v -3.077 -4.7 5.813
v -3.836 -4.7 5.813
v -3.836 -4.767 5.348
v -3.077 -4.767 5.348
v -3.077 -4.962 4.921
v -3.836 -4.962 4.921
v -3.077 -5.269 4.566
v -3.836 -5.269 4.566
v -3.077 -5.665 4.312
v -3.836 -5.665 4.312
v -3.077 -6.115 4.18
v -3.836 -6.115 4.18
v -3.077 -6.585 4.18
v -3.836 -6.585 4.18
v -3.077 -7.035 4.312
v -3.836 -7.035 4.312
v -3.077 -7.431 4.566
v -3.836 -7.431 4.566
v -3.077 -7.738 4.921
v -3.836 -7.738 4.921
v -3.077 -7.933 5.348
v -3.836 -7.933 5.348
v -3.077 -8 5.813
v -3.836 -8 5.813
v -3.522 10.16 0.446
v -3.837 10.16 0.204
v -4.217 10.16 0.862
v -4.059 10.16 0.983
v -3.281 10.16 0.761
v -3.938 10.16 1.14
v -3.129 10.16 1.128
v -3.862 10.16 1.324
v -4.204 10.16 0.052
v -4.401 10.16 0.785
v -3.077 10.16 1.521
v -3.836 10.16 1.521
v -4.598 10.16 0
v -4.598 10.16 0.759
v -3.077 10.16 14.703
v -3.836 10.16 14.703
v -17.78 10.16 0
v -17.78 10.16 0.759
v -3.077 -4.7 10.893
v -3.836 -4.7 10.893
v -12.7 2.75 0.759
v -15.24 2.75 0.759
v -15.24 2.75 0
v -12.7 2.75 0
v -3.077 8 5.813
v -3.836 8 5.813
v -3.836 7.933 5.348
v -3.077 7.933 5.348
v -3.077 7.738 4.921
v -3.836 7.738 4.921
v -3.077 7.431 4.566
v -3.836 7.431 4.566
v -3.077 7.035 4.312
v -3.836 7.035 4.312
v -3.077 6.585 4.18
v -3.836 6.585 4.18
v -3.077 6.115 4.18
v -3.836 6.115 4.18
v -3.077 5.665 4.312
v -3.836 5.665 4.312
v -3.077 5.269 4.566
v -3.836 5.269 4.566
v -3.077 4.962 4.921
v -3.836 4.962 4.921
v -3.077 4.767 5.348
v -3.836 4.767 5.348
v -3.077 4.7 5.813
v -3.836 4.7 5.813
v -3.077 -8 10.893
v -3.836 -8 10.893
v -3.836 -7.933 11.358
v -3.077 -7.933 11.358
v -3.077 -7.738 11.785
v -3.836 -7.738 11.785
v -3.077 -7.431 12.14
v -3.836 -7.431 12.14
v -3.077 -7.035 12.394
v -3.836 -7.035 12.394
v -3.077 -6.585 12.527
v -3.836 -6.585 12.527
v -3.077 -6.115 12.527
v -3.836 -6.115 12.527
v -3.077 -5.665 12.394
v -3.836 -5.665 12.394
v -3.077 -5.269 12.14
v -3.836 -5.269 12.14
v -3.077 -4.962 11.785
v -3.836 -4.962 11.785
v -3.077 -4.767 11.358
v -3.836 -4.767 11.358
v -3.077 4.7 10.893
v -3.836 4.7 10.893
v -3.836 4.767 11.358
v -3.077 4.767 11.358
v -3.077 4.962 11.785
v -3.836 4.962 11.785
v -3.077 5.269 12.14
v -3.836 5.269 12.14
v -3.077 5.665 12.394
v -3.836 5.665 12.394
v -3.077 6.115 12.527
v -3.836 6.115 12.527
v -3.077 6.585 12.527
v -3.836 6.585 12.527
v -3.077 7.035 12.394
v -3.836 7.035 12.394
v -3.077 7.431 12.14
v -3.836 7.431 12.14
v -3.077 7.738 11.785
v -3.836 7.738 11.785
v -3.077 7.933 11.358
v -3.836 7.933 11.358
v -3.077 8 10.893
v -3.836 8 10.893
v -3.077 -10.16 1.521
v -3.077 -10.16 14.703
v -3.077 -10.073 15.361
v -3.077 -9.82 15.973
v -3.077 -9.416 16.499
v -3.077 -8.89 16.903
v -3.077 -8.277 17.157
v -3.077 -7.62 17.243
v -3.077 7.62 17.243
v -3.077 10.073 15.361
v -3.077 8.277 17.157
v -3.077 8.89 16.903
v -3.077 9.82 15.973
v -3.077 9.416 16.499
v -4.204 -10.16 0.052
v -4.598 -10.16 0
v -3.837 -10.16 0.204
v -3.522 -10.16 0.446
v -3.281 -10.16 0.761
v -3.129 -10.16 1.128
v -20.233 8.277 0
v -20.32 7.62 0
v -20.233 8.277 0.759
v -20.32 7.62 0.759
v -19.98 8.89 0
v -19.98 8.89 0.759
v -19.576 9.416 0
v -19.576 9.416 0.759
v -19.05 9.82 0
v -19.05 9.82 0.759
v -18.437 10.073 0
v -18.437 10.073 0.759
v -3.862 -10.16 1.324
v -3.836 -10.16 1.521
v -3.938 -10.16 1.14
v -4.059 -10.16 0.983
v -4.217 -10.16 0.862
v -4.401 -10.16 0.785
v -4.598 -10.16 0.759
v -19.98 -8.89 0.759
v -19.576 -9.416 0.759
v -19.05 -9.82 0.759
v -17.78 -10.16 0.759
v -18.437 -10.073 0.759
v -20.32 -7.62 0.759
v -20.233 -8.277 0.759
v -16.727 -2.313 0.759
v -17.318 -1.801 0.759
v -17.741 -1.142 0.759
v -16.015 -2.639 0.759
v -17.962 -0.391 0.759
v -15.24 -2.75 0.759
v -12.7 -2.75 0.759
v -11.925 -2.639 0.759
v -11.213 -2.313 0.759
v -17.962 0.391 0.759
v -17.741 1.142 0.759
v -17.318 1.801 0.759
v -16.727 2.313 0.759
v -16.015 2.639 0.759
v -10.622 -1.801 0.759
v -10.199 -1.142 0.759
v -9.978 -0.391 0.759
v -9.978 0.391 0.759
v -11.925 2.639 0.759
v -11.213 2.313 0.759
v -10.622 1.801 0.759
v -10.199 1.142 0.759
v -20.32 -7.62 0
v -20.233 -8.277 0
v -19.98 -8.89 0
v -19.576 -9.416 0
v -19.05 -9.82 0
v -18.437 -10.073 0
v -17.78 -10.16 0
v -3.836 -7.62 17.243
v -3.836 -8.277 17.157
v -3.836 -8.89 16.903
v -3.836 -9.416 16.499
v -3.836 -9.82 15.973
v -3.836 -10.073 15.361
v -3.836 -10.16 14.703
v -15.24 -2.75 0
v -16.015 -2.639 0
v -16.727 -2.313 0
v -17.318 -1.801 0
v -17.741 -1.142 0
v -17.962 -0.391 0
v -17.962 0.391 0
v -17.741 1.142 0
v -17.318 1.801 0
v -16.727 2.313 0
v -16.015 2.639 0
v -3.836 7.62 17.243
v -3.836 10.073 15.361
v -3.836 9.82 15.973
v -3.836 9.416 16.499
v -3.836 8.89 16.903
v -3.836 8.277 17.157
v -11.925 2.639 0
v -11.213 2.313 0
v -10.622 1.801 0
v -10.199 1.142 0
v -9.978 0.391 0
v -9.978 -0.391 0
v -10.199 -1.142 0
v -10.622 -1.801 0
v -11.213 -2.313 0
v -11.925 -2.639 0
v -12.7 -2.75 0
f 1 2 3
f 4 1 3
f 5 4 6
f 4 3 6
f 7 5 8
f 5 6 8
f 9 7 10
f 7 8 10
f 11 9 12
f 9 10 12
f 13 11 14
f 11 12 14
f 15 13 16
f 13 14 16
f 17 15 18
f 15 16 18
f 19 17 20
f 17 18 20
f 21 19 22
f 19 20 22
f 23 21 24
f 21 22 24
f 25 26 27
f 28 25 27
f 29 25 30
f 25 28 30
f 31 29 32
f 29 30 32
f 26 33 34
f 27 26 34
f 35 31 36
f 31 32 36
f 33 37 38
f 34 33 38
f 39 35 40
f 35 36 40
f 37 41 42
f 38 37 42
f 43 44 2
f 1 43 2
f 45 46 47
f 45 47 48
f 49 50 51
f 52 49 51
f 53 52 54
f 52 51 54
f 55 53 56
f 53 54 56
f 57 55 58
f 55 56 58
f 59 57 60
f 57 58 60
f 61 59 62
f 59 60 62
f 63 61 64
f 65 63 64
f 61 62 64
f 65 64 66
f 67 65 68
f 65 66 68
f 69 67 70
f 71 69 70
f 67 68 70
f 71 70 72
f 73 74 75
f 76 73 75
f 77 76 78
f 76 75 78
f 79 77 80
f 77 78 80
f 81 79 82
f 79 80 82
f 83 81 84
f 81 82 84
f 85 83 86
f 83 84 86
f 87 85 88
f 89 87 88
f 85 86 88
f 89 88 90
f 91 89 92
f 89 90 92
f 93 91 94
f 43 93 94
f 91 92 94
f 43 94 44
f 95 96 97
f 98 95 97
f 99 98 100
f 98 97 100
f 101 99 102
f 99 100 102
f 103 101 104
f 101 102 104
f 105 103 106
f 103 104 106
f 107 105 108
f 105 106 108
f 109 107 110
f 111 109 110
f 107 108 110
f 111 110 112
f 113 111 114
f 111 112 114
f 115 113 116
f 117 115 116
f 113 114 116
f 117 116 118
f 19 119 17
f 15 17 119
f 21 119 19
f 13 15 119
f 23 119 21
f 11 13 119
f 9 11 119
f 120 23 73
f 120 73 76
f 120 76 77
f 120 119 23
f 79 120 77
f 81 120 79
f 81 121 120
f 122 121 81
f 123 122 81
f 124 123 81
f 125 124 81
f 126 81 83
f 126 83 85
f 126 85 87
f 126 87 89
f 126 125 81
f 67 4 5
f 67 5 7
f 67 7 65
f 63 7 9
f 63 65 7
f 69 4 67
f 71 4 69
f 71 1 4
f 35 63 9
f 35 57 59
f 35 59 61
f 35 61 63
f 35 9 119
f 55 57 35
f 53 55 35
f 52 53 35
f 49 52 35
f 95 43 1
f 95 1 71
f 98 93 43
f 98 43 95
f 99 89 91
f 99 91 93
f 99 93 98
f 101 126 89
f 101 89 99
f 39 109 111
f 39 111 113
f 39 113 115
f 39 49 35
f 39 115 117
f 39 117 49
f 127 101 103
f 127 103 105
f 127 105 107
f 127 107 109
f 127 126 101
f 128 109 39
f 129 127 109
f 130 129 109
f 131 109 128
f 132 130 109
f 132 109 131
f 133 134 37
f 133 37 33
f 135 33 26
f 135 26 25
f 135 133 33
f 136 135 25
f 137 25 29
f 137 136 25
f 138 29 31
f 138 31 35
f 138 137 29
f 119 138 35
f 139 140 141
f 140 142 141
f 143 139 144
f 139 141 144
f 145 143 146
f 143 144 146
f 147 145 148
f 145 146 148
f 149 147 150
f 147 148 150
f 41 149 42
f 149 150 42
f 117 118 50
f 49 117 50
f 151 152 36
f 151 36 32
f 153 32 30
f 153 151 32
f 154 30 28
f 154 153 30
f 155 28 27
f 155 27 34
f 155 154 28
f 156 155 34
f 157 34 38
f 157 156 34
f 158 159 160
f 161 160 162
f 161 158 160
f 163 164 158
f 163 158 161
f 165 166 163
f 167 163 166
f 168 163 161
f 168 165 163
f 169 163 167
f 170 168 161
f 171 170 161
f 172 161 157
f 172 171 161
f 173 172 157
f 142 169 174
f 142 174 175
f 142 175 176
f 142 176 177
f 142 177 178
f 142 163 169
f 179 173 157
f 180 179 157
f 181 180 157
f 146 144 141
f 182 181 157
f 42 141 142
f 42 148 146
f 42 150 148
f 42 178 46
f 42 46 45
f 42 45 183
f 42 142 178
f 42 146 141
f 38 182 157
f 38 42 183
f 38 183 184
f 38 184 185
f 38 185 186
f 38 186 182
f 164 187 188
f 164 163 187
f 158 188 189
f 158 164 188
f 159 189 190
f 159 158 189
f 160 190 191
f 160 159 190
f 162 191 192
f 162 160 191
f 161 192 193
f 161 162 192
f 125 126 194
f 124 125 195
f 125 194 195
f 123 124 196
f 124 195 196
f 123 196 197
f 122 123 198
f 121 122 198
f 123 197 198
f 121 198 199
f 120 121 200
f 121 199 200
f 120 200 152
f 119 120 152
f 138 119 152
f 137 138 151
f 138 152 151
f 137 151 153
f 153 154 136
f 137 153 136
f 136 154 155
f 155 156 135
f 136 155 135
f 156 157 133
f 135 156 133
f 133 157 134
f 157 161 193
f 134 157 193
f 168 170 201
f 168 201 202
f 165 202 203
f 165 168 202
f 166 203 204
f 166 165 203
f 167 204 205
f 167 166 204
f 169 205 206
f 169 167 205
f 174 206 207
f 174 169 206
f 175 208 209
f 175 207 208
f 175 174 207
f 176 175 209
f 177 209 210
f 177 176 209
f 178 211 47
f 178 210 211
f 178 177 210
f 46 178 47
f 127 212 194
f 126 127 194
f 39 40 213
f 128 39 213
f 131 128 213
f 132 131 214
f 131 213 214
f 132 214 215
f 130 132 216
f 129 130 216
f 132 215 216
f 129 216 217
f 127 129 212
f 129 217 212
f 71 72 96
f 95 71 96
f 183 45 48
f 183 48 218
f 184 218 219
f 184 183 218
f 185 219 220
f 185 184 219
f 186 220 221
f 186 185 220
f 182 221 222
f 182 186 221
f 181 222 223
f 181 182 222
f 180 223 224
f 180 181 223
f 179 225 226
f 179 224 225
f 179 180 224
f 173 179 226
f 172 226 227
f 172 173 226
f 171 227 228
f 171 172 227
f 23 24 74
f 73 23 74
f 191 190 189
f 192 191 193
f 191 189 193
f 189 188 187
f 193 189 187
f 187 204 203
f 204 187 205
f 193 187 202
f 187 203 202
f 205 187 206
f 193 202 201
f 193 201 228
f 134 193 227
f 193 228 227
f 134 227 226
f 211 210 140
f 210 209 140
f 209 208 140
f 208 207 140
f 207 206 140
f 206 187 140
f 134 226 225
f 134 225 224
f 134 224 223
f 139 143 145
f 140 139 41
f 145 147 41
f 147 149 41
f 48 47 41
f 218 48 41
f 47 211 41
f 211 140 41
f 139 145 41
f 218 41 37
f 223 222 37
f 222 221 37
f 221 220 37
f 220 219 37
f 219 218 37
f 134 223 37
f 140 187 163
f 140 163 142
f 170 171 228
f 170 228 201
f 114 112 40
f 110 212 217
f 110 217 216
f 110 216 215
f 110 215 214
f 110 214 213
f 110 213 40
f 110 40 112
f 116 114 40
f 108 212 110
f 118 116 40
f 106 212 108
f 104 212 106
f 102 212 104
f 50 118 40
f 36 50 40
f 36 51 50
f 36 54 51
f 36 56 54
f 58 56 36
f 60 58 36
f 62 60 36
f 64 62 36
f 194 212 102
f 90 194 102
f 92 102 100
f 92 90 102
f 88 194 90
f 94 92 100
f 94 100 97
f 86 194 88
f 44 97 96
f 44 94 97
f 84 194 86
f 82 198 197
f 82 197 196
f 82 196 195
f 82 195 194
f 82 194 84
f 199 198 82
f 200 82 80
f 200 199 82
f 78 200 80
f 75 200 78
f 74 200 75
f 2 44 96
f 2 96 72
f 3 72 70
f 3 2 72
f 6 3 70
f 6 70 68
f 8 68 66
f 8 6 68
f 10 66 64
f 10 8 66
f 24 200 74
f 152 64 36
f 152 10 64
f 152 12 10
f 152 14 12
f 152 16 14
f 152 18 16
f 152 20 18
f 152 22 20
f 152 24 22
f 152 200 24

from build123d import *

# Parameters (mm, degrees)
SKETCH1_W                = 33.02
SKETCH1_H                = 20.32
BOSS_EXTRUDE1_DEPTH      = 0.75946
M3_SLOTS_REACH           = 24.731
M5_SLOT_REACH            = 24.731
FILLET1_R                = 2.54
SKETCHED_START           = -3.237390165
SKETCHED_BEND1_OUTLINE_W = 20.32
SKETCHED_BEND1_OUTLINE_H = 0.75946
SKETCHED_BEND1_DEPTH     = 15.937390165
SKETCHED_START_2         = -3.83615356
SKETCHED_BEND1_2_DEPTH   = 0.10270916
SKETCHED_START_3         = -4.59815356
SKETCHED_BEND1_3_DEPTH   = 1.52146
SKETCHED_START_4         = -10.16
SKETCHED_BEND1_4_DEPTH   = 20.32


with BuildPart() as part:
    # Sketch1 → Boss-Extrude1 (new body)
    with BuildSketch(Plane.XY):
        with Locations((-3.81, 0)):
            Rectangle(SKETCH1_W, SKETCH1_H)
    extrude(amount=BOSS_EXTRUDE1_DEPTH)

    # Sketch4 → M3 Slots (cut, up to next)
    with BuildSketch(Plane.XY.offset(0.75946), mode=Mode.PRIVATE) as m3_slots_sk1:
        with BuildLine():
            Line((1.27, 8), (6.35, 8))
            ThreePointArc((6.35, 8), (8, 6.35), (6.35, 4.7))
            Line((6.35, 4.7), (1.27, 4.7))
            ThreePointArc((1.27, 4.7), (-0.38, 6.35), (1.27, 8))
        make_face()
    m3_slots_tool1 = extrude(m3_slots_sk1.sketch, amount=-M3_SLOTS_REACH, mode=Mode.PRIVATE) & part.part
    # Sketch4 → M3 Slots (cut, up to next)
    with BuildSketch(Plane.XY.offset(0.75946), mode=Mode.PRIVATE) as m3_slots_sk2:
        with BuildLine():
            Line((1.27, -4.7), (6.35, -4.7))
            ThreePointArc((6.35, -4.7), (8, -6.35), (6.35, -8))
            Line((6.35, -8), (1.27, -8))
            ThreePointArc((1.27, -8), (-0.38, -6.35), (1.27, -4.7))
        make_face()
    m3_slots_tool2 = extrude(m3_slots_sk2.sketch, amount=-M3_SLOTS_REACH, mode=Mode.PRIVATE) & part.part
    add(m3_slots_tool1.solids().sort_by_distance((3.81, 6.35, 0.75946))[0], mode=Mode.SUBTRACT)
    add(m3_slots_tool2.solids().sort_by_distance((3.81, -6.35, 0.75946))[0], mode=Mode.SUBTRACT)

    # Sketch5 → M5 Slot (cut, up to next)
    with BuildSketch(Plane.XY.offset(0.75946), mode=Mode.PRIVATE) as m5_slot_sk1:
        with BuildLine():
            Line((-15.24, 2.75), (-12.7, 2.75))
            ThreePointArc((-12.7, 2.75), (-9.95, 0), (-12.7, -2.75))
            Line((-12.7, -2.75), (-15.24, -2.75))
            ThreePointArc((-15.24, -2.75), (-17.99, 0), (-15.24, 2.75))
        make_face()
    m5_slot_tool1 = extrude(m5_slot_sk1.sketch, amount=-M5_SLOT_REACH, mode=Mode.PRIVATE) & part.part
    add(m5_slot_tool1.solids().sort_by_distance((-13.97, 0, 0.75946))[0], mode=Mode.SUBTRACT)

    # Fillet1
    fillet1_edges = [part.edges().sort_by_distance(p)[0] for p in [
        (-20.32, -10.16, 0.37973),
        (-20.32, 10.16, 0.37973),
        (12.7, 10.16, 0.37973),
        (12.7, -10.16, 0.37973),
    ]]
    fillet(fillet1_edges, radius=FILLET1_R)

    # Sketched Bend1: read off the stored shape, not the designer's step
    # Sketched Bend1 outline → Sketched Bend1 (cut)
    with BuildSketch(Plane.YZ.offset(SKETCHED_START)):
        with Locations((0, 0.37973)):
            Rectangle(SKETCHED_BEND1_OUTLINE_W, SKETCHED_BEND1_OUTLINE_H)
    extrude(amount=SKETCHED_BEND1_DEPTH, mode=Mode.SUBTRACT)

    # Sketched Bend1 2 outline → Sketched Bend1 2 (add)
    with BuildSketch(Plane.YZ.offset(SKETCHED_START_2)):
        with BuildLine():
            Line((7.62, 17.24330644), (-7.62, 17.24330644))
            ThreePointArc((-7.62, 17.24330644), (-9.416051224, 16.499357664), (-10.16, 14.70330644))
            Line((-10.16, 14.70330644), (-10.16, 0.75946))
            Line((-10.16, 0.75946), (10.16, 0.75946))
            Line((10.16, 0.75946), (10.16, 14.70330644))
            ThreePointArc((10.16, 14.70330644), (9.416051224, 16.499357664), (7.62, 17.24330644))
        make_face()
        with BuildLine():
            ThreePointArc((-8, 10.89330644), (-6.35, 12.54330644), (-4.7, 10.89330644))
            Line((-4.7, 10.89330644), (-4.7, 5.81330644))
            ThreePointArc((-4.7, 5.81330644), (-6.35, 4.16330644), (-8, 5.81330644))
            Line((-8, 5.81330644), (-8, 10.89330644))
        make_face(mode=Mode.SUBTRACT)
        with BuildLine():
            ThreePointArc((4.7, 10.89330644), (6.35, 12.54330644), (8, 10.89330644))
            Line((8, 10.89330644), (8, 5.81330644))
            ThreePointArc((8, 5.81330644), (6.35, 4.16330644), (4.7, 5.81330644))
            Line((4.7, 5.81330644), (4.7, 10.89330644))
        make_face(mode=Mode.SUBTRACT)
    extrude(amount=SKETCHED_BEND1_2_DEPTH)

    # Sketched Bend1 3 outline → Sketched Bend1 3 (add)
    with BuildSketch(Plane.YZ.offset(SKETCHED_START_3)):
        with BuildLine():
            Line((7.62, 17.24330644), (-7.62, 17.24330644))
            ThreePointArc((-7.62, 17.24330644), (-9.416051224, 16.499357664), (-10.16, 14.70330644))
            Line((-10.16, 14.70330644), (-10.16, 0.75946))
            Line((-10.16, 0.75946), (10.16, 0.75946))
            Line((10.16, 0.75946), (10.16, 14.70330644))
            ThreePointArc((10.16, 14.70330644), (9.416051224, 16.499357664), (7.62, 17.24330644))
        make_face()
        with BuildLine():
            ThreePointArc((-8, 10.89330644), (-6.35, 12.54330644), (-4.7, 10.89330644))
            Line((-4.7, 10.89330644), (-4.7, 5.81330644))
            ThreePointArc((-4.7, 5.81330644), (-6.35, 4.16330644), (-8, 5.81330644))
            Line((-8, 5.81330644), (-8, 10.89330644))
        make_face(mode=Mode.SUBTRACT)
        with BuildLine():
            ThreePointArc((4.7, 10.89330644), (6.35, 12.54330644), (8, 10.89330644))
            Line((8, 10.89330644), (8, 5.81330644))
            ThreePointArc((8, 5.81330644), (6.35, 4.16330644), (4.7, 5.81330644))
            Line((4.7, 5.81330644), (4.7, 10.89330644))
        make_face(mode=Mode.SUBTRACT)
    extrude(amount=SKETCHED_BEND1_3_DEPTH)

    # Sketched Bend1 4 outline → Sketched Bend1 4 (cut)
    with BuildSketch(Plane(origin=(0, 0, 0), x_dir=(1, 0, 0), z_dir=(0, 1, 0)).offset(SKETCHED_START_4)):
        with BuildLine():
            Line((-4.59815356, -17.24330644), (-3.83615356, -17.24330644))
            Line((-3.83615356, -17.24330644), (-3.83615356, -1.52146))
            ThreePointArc((-3.83615356, -1.52146), (-4.059338193, -0.982644633), (-4.59815356, -0.75946))
            Line((-4.59815356, -0.75946), (-4.59815356, -17.24330644))
        make_face()
        with BuildLine():
            ThreePointArc((-4.59815356, 0), (-3.522318877, -0.445625317), (-3.07669356, -1.52146))
            Line((-3.07669356, -1.52146), (-3.07669356, -0.75946))
            Line((-3.07669356, -0.75946), (-3.237390165, -0.75946))
            Line((-3.237390165, -0.75946), (-3.237390165, 0))
            Line((-3.237390165, 0), (-4.59815356, 0))
        make_face()
    extrude(amount=SKETCHED_BEND1_4_DEPTH, mode=Mode.SUBTRACT)


solid = part.part
